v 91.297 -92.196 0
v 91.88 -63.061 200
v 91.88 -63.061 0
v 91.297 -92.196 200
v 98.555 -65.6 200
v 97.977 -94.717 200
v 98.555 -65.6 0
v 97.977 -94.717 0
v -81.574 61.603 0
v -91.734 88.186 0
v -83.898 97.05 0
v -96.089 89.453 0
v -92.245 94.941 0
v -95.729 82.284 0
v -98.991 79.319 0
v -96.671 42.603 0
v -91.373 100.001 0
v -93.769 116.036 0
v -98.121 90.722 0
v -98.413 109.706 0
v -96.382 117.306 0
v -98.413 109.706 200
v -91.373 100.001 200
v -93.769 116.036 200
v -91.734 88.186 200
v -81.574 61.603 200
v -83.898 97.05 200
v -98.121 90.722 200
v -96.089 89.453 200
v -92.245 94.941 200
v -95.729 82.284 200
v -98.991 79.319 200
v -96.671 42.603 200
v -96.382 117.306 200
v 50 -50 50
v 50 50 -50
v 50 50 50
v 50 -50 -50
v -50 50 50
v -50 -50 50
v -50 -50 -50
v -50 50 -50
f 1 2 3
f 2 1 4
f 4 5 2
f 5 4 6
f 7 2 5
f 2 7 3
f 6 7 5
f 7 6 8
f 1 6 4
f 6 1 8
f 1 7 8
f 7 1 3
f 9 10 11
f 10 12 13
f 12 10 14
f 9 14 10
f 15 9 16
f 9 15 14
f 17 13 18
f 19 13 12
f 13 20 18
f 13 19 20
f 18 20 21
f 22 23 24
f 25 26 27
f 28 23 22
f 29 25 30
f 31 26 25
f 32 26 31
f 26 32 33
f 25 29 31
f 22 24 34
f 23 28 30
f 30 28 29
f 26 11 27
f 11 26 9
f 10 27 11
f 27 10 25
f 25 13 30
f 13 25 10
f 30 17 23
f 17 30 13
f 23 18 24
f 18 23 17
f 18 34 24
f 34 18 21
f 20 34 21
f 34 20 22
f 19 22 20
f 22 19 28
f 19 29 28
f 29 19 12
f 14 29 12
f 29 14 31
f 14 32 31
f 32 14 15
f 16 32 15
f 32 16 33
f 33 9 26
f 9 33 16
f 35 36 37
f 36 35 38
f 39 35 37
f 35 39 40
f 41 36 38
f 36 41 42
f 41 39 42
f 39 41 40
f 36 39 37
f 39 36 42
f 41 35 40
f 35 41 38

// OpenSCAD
// Generated with Prismap, written by Jim DeVona
// https://github.com/anoved/prismap

inflation = 1000;
minlat = 40.4416 * inflation;
maxlat = 40.4461 * inflation;
minlon = -79.94850 * inflation;
maxlon = -79.9471442 * inflation;

n1 = [40.4459042, -79.9484471] * inflation;
n2 = [40.4460545, -79.9484642] * inflation;
n3 = [40.4460675, -79.9482668] * inflation;
n4 = [40.4459173, -79.9482496] * inflation;

s1 = [40.4420146, -79.9474045] * inflation;
s2 = [40.4416749, -79.9475333] * inflation;
s3 = [40.4416227, -79.9472844] * inflation;
s4 = [40.4416961, -79.9472643] * inflation;
s5 = [40.4416880, -79.9472157] * inflation;
s6 = [40.4416423, -79.9472071] * inflation;
s7 = [40.4416357, -79.9470784] * inflation;
s8 = [40.4416814, -79.9470269] * inflation;
s9 = [40.4417402, -79.9470355] * inflation;
s10 = [40.4417941, -79.9471442] * inflation;
s11 = [40.4417745, -79.9471785] * inflation;
s12 = [40.4417860, -79.9472243] * inflation;
s13 = [40.4419623, -79.9471642] * inflation;

building1 = [s1, s2, s3, s4, s5, s6, s7, s8, s9, s10, s11, s12, s13];

x_size_limit = 200;
y_size_limit = 200;

x_scale = x_size_limit / (maxlat - minlat);
y_scale = y_size_limit / (maxlon - minlon);

x_trans = -(minlat+maxlat) / 2;
y_trans = -(minlon+maxlon) / 2;

VegeGarden();

module feature0() {
		//translate([bx, by, 0]) scale([1, 1, 1]) 
		linear_extrude(height=200) polygon(points=[
			n1, n2, n3, n4]);
}

module feature1() {
		//translate([bx, by, 0]) scale([1, 1, 1]) 
		linear_extrude(height=200) polygon(points=building1);
}

module printStat(){
	echo("x_scale: ", x_scale, " y_scale: ", y_scale);
	echo("x_trans: ", x_trans, " y_trans: ", y_trans);
}

module VegeGarden() {
	translate([-50, -50, -50]){
		cube([100, 100, 100]);
	}
	printStat();
	scale([x_scale, y_scale, 1]) 
	translate([x_trans, y_trans, 0]){
		feature0();
		feature1();
	}
}
